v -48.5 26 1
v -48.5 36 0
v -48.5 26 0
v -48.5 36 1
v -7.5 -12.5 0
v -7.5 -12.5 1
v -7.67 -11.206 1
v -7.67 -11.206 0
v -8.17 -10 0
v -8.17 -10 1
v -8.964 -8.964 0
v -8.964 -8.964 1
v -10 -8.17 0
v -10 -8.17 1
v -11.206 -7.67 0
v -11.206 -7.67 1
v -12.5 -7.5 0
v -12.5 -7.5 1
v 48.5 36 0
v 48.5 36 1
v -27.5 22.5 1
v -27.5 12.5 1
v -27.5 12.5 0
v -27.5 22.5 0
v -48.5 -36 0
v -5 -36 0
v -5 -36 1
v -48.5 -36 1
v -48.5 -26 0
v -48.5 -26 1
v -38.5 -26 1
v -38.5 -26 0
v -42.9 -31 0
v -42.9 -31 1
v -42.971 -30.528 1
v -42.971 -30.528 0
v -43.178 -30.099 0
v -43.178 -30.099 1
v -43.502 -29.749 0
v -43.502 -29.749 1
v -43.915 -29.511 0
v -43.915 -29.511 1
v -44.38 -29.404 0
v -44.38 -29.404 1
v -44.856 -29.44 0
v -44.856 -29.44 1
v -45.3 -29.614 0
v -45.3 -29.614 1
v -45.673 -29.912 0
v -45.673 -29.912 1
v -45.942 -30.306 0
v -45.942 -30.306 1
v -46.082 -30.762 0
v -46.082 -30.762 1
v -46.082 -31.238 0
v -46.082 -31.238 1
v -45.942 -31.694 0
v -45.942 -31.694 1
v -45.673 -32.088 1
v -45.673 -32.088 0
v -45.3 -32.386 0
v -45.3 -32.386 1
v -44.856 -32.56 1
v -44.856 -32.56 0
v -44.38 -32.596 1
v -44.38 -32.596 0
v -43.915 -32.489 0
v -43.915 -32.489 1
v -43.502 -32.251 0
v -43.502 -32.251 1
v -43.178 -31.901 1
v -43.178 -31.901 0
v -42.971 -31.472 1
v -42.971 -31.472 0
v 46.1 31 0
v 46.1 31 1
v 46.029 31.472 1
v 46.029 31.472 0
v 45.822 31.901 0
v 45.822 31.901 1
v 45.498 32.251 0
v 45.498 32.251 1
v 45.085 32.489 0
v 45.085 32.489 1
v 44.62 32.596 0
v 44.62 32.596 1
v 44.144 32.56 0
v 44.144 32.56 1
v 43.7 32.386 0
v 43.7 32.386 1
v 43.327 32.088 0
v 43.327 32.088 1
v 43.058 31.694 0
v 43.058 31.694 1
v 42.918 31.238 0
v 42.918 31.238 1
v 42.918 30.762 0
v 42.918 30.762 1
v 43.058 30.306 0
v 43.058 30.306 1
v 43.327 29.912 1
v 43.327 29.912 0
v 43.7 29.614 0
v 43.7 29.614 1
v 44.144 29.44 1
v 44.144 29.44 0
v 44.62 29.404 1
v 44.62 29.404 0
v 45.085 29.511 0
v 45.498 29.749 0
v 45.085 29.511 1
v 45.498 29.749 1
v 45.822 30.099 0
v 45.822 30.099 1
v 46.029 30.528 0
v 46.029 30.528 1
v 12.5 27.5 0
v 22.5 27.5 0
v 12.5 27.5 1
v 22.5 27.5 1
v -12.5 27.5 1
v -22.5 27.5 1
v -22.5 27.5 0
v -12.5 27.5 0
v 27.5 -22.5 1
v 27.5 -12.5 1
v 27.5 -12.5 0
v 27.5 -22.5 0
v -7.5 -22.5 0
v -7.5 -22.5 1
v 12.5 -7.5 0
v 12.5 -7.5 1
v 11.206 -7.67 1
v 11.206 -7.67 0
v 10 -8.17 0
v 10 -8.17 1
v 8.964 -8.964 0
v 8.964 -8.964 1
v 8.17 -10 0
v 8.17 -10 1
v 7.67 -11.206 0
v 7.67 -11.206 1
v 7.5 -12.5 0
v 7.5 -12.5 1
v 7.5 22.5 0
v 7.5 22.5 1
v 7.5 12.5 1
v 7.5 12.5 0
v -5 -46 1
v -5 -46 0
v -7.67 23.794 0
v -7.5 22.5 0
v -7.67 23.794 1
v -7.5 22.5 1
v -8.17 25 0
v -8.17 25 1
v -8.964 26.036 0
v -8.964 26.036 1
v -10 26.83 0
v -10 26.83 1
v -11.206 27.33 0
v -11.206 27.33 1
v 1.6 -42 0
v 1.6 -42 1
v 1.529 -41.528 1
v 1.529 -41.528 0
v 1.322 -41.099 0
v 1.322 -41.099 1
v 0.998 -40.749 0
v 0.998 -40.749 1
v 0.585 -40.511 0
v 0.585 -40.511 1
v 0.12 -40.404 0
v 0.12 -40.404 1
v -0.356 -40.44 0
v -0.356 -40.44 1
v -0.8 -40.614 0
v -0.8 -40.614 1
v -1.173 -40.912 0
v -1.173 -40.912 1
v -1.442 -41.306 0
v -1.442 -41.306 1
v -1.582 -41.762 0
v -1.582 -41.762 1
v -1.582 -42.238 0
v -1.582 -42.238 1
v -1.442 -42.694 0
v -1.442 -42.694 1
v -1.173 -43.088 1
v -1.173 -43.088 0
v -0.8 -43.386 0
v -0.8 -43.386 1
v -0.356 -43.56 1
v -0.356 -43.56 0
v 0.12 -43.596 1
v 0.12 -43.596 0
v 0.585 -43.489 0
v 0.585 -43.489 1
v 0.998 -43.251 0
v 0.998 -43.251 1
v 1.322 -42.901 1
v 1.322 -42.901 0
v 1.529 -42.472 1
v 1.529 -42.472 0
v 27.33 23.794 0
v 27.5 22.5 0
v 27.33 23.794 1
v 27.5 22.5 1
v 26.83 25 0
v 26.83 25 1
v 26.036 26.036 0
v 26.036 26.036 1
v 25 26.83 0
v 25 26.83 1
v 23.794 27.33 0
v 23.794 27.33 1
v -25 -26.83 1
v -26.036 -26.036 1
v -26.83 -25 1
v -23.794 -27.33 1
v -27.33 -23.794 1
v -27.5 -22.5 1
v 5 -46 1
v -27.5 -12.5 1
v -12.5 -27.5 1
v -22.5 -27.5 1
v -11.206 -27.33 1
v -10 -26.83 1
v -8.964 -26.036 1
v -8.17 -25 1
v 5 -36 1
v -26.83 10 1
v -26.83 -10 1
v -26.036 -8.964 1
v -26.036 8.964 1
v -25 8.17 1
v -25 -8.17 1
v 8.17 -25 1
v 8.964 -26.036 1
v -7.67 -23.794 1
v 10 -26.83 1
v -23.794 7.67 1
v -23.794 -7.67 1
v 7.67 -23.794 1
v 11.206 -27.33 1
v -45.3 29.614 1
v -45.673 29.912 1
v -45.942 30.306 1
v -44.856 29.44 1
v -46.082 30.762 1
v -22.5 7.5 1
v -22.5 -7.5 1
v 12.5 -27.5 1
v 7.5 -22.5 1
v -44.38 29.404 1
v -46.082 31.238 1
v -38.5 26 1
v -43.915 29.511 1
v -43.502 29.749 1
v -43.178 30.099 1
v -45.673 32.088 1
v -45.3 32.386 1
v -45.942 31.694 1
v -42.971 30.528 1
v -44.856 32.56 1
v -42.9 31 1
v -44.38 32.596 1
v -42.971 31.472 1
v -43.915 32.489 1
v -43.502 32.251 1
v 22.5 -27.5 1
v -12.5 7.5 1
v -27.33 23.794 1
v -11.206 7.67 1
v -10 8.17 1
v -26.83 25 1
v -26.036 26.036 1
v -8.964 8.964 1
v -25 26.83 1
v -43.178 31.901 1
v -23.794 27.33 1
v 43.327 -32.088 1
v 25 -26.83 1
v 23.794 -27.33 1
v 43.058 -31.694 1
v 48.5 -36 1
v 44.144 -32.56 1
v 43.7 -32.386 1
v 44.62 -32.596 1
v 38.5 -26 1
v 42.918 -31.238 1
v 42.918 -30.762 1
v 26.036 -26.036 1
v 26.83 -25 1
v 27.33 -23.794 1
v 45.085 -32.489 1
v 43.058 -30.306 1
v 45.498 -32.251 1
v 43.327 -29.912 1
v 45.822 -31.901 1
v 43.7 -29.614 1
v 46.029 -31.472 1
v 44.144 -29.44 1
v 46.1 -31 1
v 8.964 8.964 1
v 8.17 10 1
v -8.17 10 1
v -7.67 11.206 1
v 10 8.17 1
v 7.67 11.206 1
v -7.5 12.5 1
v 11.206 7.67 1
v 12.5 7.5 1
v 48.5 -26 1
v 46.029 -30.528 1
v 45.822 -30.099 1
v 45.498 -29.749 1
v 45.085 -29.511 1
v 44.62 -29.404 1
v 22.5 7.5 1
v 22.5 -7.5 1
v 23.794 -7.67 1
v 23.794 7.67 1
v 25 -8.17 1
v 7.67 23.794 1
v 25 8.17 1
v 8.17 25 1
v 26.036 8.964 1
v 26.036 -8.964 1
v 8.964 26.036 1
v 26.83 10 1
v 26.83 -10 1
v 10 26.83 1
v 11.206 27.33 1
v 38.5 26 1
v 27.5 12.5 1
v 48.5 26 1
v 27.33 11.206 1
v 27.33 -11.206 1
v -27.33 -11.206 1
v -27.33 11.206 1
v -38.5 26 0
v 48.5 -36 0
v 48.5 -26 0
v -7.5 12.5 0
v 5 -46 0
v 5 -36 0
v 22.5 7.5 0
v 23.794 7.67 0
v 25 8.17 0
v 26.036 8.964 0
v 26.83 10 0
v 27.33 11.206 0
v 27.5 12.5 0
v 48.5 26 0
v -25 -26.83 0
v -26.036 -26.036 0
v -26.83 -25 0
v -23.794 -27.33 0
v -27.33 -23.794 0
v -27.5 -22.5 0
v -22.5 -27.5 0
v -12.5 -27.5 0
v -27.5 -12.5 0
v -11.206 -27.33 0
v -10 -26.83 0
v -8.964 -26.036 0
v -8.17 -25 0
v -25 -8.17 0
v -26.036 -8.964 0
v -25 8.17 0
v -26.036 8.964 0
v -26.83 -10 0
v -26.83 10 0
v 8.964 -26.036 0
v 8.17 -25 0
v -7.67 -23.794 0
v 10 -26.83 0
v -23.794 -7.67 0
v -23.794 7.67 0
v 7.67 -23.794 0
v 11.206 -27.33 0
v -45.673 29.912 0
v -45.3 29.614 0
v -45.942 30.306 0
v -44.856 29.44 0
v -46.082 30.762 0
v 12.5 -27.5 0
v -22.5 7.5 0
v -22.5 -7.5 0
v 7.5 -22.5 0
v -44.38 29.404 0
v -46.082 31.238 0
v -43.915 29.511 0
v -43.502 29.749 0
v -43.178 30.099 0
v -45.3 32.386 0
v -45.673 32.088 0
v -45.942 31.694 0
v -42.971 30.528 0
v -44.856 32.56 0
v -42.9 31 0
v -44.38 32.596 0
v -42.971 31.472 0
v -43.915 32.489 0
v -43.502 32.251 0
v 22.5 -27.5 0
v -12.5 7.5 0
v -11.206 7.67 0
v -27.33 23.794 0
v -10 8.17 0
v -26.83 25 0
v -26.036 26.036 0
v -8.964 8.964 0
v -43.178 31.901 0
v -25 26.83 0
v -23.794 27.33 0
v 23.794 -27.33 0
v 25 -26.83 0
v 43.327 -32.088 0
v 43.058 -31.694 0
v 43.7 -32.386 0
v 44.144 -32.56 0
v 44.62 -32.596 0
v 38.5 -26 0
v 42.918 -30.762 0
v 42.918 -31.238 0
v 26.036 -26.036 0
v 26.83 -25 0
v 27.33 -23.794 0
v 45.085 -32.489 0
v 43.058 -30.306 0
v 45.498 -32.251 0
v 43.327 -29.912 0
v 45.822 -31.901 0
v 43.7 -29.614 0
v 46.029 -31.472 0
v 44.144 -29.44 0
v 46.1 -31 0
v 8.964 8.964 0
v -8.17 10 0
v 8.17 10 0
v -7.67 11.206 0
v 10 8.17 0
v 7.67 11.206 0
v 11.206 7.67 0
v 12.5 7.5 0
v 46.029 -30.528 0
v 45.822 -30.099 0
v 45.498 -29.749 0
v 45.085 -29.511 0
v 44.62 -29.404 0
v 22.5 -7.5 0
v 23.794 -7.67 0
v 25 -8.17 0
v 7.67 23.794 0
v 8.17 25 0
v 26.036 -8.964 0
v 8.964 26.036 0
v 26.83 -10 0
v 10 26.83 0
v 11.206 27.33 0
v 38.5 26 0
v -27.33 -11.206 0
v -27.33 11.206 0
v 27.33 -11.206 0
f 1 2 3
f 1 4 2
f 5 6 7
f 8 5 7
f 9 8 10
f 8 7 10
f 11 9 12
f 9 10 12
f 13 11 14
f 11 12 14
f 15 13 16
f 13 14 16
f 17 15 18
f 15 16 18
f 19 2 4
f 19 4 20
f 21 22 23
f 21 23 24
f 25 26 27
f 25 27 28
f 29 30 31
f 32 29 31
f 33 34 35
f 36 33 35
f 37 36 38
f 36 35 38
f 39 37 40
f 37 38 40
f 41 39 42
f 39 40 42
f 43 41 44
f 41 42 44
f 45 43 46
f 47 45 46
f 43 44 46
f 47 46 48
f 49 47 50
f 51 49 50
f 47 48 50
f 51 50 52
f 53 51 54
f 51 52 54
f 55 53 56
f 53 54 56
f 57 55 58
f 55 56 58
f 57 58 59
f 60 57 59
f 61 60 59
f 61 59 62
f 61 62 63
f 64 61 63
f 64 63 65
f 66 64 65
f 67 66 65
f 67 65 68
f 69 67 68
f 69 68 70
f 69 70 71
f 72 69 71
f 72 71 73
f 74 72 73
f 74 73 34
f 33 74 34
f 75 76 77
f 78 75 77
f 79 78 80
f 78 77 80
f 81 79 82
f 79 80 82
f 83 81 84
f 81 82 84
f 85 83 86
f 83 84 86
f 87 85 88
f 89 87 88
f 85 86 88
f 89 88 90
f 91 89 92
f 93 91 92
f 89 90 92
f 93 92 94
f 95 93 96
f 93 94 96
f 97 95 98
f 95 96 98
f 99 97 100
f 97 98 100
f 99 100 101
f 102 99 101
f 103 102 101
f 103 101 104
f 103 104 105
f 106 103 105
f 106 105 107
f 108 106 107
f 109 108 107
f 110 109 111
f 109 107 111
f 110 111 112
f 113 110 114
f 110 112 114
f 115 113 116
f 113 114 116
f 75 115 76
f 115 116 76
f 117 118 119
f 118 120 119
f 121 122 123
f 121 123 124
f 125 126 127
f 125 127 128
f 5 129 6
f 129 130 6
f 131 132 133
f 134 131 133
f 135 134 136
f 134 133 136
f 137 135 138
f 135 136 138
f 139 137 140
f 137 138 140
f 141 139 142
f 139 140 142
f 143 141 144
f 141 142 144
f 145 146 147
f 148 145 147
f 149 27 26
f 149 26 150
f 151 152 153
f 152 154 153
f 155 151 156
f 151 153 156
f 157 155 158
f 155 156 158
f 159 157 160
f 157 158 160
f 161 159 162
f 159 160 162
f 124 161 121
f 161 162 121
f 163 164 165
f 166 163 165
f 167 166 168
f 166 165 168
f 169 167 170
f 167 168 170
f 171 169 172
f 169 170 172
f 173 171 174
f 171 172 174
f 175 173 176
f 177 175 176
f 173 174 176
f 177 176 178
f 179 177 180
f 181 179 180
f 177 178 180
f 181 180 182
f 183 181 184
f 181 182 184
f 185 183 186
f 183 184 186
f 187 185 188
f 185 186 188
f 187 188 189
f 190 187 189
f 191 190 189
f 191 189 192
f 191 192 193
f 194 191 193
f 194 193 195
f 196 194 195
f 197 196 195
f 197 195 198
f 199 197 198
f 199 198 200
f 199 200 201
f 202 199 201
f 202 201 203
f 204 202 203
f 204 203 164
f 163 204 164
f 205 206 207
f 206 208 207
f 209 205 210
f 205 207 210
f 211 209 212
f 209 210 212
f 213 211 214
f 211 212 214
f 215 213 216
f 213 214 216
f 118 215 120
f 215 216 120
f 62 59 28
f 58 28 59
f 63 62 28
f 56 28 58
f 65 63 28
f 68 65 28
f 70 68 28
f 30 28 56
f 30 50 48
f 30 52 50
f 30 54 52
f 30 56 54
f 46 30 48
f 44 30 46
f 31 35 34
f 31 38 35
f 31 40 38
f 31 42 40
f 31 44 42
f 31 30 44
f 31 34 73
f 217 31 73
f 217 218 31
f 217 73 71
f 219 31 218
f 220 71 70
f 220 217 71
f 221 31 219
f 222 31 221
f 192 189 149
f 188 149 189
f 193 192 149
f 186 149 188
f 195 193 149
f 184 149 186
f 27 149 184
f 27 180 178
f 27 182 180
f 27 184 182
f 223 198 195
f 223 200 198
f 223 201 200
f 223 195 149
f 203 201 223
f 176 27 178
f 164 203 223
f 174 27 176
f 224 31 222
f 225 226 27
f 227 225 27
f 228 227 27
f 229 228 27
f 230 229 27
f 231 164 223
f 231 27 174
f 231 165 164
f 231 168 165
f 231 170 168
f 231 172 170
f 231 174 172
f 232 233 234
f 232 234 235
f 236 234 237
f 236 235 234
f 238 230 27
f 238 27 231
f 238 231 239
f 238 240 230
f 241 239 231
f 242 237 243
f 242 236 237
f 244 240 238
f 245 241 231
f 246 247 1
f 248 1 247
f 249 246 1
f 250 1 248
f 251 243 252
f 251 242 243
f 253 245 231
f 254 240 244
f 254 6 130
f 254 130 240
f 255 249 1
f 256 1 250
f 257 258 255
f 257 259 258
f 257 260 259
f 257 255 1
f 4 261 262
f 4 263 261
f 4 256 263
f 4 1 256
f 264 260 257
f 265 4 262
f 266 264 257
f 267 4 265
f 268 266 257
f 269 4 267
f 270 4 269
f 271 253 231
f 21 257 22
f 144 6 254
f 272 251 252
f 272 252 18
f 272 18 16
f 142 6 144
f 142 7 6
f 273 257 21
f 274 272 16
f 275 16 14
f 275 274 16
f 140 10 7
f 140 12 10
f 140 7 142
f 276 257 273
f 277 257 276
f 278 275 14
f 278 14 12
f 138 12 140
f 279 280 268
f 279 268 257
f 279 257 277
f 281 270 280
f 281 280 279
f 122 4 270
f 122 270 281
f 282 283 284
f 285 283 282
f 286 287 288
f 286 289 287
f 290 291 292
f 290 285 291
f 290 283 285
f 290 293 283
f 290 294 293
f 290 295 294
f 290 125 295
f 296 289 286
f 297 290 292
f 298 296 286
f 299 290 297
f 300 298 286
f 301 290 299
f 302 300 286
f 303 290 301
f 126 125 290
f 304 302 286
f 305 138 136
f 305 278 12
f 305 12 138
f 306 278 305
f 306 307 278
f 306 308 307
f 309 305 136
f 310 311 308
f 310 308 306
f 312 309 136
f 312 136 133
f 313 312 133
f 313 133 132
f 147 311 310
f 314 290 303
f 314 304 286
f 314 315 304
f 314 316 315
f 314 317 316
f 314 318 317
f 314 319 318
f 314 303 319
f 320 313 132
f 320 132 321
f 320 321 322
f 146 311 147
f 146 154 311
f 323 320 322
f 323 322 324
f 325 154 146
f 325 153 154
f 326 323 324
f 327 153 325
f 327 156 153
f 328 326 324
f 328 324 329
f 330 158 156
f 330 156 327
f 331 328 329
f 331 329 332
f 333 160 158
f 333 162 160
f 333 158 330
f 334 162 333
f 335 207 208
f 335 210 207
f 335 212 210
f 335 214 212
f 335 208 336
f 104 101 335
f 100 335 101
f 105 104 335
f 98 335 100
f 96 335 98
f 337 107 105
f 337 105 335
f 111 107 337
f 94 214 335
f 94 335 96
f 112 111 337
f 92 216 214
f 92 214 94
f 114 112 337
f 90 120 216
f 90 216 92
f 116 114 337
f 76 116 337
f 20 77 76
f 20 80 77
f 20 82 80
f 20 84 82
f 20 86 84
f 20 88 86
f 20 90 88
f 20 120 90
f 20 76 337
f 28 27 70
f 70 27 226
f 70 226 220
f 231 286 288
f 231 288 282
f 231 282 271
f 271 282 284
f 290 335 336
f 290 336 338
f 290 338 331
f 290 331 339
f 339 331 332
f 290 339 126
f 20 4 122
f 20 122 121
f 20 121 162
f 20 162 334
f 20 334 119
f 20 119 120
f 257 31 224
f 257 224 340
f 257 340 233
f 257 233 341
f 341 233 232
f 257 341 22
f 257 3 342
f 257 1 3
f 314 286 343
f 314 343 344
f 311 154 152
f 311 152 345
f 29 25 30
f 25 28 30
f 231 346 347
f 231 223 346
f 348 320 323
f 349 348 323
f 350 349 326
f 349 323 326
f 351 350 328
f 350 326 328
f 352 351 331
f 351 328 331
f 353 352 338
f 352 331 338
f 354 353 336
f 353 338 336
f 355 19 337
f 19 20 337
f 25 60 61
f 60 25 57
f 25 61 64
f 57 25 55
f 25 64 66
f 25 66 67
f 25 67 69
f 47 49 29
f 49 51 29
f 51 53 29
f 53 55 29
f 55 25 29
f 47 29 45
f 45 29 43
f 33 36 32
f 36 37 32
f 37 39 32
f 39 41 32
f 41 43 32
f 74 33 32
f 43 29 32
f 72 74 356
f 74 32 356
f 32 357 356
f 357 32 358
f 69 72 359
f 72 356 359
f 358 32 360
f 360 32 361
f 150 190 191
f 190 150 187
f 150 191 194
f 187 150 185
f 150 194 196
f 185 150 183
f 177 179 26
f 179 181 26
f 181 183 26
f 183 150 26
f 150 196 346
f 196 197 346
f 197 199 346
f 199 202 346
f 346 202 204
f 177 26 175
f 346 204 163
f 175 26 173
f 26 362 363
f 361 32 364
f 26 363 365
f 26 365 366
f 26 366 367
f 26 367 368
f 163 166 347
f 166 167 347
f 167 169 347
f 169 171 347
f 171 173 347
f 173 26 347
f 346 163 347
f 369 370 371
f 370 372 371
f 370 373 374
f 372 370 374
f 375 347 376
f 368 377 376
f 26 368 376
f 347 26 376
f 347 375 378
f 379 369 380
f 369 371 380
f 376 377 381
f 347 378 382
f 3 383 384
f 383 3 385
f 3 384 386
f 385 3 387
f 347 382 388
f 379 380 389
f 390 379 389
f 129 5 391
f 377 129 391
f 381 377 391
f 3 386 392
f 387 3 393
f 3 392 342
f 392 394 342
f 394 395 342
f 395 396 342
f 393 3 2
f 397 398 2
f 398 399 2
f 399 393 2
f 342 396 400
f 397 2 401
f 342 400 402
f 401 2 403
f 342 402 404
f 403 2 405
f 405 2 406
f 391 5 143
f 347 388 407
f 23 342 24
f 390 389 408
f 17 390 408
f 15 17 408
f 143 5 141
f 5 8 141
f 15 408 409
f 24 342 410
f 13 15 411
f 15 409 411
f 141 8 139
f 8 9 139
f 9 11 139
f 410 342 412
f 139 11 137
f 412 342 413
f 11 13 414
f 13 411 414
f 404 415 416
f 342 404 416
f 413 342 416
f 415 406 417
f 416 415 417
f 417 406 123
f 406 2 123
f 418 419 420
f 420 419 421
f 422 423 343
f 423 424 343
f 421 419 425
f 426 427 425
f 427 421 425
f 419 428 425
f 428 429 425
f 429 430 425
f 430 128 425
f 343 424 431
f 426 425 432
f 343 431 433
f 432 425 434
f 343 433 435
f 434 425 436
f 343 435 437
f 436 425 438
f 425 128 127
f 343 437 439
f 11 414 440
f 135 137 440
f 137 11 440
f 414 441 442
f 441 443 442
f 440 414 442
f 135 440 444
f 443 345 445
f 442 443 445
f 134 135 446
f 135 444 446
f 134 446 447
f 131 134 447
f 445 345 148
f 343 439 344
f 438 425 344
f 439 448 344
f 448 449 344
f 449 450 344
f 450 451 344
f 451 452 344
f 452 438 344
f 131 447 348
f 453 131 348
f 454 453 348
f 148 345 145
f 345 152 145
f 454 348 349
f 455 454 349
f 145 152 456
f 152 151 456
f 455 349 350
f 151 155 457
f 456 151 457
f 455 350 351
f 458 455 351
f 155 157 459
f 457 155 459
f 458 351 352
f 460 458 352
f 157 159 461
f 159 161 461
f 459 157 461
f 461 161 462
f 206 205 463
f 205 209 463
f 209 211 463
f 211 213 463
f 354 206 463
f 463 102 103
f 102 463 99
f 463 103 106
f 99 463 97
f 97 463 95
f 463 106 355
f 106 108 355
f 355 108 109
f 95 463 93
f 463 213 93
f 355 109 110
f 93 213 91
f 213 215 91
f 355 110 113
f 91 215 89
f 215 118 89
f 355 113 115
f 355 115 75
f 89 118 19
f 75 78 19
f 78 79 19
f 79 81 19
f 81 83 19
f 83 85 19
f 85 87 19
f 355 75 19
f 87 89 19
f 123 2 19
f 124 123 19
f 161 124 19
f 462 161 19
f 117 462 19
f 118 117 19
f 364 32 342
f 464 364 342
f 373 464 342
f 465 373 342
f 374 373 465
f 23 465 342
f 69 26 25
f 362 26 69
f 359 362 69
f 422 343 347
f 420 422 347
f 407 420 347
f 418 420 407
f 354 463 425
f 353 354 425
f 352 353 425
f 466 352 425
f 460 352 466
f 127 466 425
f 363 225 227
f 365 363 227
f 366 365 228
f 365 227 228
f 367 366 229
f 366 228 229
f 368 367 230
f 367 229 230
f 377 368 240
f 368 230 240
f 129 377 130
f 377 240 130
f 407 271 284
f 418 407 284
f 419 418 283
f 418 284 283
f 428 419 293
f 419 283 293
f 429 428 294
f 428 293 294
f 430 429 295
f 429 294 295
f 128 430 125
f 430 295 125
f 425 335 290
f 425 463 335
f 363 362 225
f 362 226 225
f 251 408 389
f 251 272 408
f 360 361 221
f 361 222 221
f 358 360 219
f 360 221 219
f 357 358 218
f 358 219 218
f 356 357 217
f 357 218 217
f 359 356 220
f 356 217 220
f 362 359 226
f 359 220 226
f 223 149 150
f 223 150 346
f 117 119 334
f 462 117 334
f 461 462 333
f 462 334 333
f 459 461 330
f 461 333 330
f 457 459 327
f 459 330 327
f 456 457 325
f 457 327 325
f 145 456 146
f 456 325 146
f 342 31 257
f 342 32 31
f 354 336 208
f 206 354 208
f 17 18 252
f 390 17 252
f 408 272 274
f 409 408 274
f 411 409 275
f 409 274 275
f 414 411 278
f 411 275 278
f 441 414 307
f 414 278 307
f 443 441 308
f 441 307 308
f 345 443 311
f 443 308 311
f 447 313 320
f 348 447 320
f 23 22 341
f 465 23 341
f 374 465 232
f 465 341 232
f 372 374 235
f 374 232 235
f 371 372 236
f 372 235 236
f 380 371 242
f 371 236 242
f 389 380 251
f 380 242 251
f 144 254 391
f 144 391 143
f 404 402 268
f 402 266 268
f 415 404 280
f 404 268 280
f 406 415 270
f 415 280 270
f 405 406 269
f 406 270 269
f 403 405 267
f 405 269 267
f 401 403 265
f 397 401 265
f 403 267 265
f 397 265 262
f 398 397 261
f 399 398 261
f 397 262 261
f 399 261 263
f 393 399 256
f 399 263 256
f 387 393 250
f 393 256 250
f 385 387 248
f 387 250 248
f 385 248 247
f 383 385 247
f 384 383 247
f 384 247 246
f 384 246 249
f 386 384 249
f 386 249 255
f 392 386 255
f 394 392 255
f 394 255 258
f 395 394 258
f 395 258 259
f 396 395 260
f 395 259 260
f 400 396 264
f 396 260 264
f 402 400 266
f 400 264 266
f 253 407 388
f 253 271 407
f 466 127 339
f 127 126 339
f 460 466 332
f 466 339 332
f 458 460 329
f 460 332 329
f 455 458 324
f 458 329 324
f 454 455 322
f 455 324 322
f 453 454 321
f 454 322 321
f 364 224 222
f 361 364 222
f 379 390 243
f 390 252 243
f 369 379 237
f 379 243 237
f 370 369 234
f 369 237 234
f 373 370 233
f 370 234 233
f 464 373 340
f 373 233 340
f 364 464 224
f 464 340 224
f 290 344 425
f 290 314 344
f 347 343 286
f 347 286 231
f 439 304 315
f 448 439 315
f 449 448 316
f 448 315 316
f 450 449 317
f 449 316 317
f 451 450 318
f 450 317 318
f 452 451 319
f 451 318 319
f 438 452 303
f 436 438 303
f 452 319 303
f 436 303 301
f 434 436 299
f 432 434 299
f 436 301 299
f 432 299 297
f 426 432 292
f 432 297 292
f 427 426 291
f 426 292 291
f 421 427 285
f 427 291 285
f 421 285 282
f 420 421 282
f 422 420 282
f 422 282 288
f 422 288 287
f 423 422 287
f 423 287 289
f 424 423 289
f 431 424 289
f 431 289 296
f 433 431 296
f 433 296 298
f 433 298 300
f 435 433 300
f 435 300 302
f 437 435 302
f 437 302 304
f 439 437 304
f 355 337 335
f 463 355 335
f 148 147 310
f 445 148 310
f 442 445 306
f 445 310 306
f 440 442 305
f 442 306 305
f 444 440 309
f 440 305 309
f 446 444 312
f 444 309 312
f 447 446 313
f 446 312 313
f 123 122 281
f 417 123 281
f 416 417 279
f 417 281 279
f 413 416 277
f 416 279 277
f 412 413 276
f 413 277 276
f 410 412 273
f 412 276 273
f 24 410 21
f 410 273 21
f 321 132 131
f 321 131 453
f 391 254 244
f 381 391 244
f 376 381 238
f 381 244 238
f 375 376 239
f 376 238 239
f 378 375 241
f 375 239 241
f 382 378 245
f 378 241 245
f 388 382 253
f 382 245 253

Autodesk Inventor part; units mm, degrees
ref_plane "YZ Plane" through (0, 0, 0) normal (1, 0, 0) x (0, 1, 0)
ref_plane "XZ Plane" through (0, 0, 0) normal (0, 1, 0) x (-1, 0, 0)
ref_plane "XY Plane" through (0, 0, 0) normal (0, 0, 1) x (1, 0, 0)
sketch "Sketch2" plane through (0, 0, 1) normal (0, 0, 1) x (1, 0, 0)
  line L0 (-38.5, 36) -> (38.5, 36)
  line L1 (-48.5, 26) -> (-38.5, 26)
  line L2 (-38.5, 26) -> (-38.5, 36)
  line L3 (-38.5, 36) -> (-48.5, 36)
  line L4 (-48.5, 36) -> (-48.5, 26)
  line L5 (-48.5, 26) -> (-38.5, 36) construction
  line L6 (-38.5, 26) -> (-48.5, 36) construction
  line L7 (0, 0) -> (0, 7.0571)
  line L8 (0, 0) -> (6.6312, 0)
  line L9 (-38.5, -36) -> (-38.5, 36)
  line L10 (48.5, 26) -> (38.5, 26)
  line L11 (38.5, 26) -> (38.5, 36)
  line L12 (38.5, 36) -> (48.5, 36)
  line L13 (48.5, 36) -> (48.5, 26)
  line L14 (48.5, 26) -> (38.5, 36) construction
  line L15 (38.5, 26) -> (48.5, 36) construction
  circle A0 centre (-44.5, 31) radius 1.6
  circle A1 centre (44.5, 31) radius 1.6
  line L16 (38.5, -36) -> (-38.5, -36)
  line L17 (-5, -46) -> (5, -46)
  line L18 (5, -46) -> (5, -36)
  line L19 (5, -36) -> (-5, -36)
  line L20 (-5, -36) -> (-5, -46)
  line L21 (-5, -46) -> (5, -36) construction
  line L22 (5, -46) -> (-5, -36) construction
  circle A2 centre (0, -42) radius 1.6
  line L23 (-48.5, -26) -> (-38.5, -26)
  line L24 (-38.5, -26) -> (-38.5, -36)
  line L25 (-38.5, -36) -> (-48.5, -36)
  line L26 (-48.5, -36) -> (-48.5, -26)
  line L27 (-48.5, -26) -> (-38.5, -36) construction
  line L28 (-38.5, -26) -> (-48.5, -36) construction
  line L29 (38.5, -26) -> (38.5, -36)
  line L30 (38.5, -36) -> (48.5, -36)
  line L31 (48.5, -36) -> (48.5, -26)
  line L32 (48.5, -26) -> (38.5, -36) construction
  line L33 (38.5, -26) -> (48.5, -36) construction
  line L34 (48.5, -26) -> (38.5, -26)
  circle A3 centre (-44.5, -31) radius 1.6
  circle A4 centre (44.5, -31) radius 1.6
  point P0 (-43.5, 31)
  point P1 (43.5, 31)
  point P2 (0, -41)
  point P3 (-38.5, -36)
  point P4 (-43.5, -31)
  point P5 (43.5, -31)
  dimension "d5" = 10
  dimension "d6" = 10
  dimension "d10" = 3.2
  dimension "d12" = 4
  dimension "d18" = 3.2
  dimension "d19" = 10
  dimension "d20" = 10
  dimension "d21" = 4
  dimension "d22" = 5
sketch "Sketch1" plane through (0, 0, 0) normal (0, 0, 1) x (1, 0, 0)
  line L0 (-38.5, 36) -> (38.5, 36)
  line L1 (38.5, 36) -> (38.5, -36)
  line L2 (38.5, -36) -> (-38.5, -36)
  line L3 (-38.5, -36) -> (-38.5, 36)
  line L4 (-38.5, 36) -> (38.5, -36) construction
  line L5 (38.5, 36) -> (-38.5, -36) construction
  point P0 (0, 0)
  dimension "d0" = 72
  dimension "d1" = 77
extrude "Plate1" add sketch "Sketch1" along normal blind 1
sketch "Sketch3" plane through (0, 0, 1) normal (0, 0, 1) x (1, 0, 0)
  line L0 (-22.5, 27.5) -> (-12.5, 27.5)
  line L1 (-7.5, 22.5) -> (-7.5, 12.5)
  line L2 (-12.5, 7.5) -> (-22.5, 7.5)
  line L3 (-27.5, 12.5) -> (-27.5, 22.5)
  line L4 (-27.5, 27.5) -> (-7.5, 7.5) construction
  line L5 (-7.5, 27.5) -> (-27.5, 7.5) construction
  line L6 (-11.1923, 0) -> (11.1923, 0)
  line L7 (0, 8.4231) -> (0, -8.4231)
  arc A0 (-22.5, 27.5) -> (-27.5, 22.5) centre (-22.5, 22.5) ccw
  arc A1 (-7.5, 22.5) -> (-12.5, 27.5) centre (-12.5, 22.5) ccw
  arc A2 (-12.5, 7.5) -> (-7.5, 12.5) centre (-12.5, 12.5) ccw
  arc A3 (-27.5, 12.5) -> (-22.5, 7.5) centre (-22.5, 12.5) ccw
  line L8 (22.5, 27.5) -> (12.5, 27.5)
  line L9 (7.5, 22.5) -> (7.5, 12.5)
  line L10 (12.5, 7.5) -> (22.5, 7.5)
  line L11 (27.5, 12.5) -> (27.5, 22.5)
  line L12 (27.5, 27.5) -> (7.5, 7.5) construction
  line L13 (7.5, 27.5) -> (27.5, 7.5) construction
  arc A4 (27.5, 22.5) -> (22.5, 27.5) centre (22.5, 22.5) ccw
  arc A5 (12.5, 27.5) -> (7.5, 22.5) centre (12.5, 22.5) ccw
  arc A6 (7.5, 12.5) -> (12.5, 7.5) centre (12.5, 12.5) ccw
  arc A7 (22.5, 7.5) -> (27.5, 12.5) centre (22.5, 12.5) ccw
  line L14 (-22.5, -27.5) -> (-12.5, -27.5)
  line L15 (-7.5, -22.5) -> (-7.5, -12.5)
  line L16 (-12.5, -7.5) -> (-22.5, -7.5)
  line L17 (-27.5, -12.5) -> (-27.5, -22.5)
  line L18 (-27.5, -27.5) -> (-7.5, -7.5) construction
  line L19 (-7.5, -27.5) -> (-27.5, -7.5) construction
  arc A8 (-27.5, -22.5) -> (-22.5, -27.5) centre (-22.5, -22.5) ccw
  arc A9 (-12.5, -27.5) -> (-7.5, -22.5) centre (-12.5, -22.5) ccw
  arc A10 (-7.5, -12.5) -> (-12.5, -7.5) centre (-12.5, -12.5) ccw
  arc A11 (-22.5, -7.5) -> (-27.5, -12.5) centre (-22.5, -12.5) ccw
  line L20 (7.5, -22.5) -> (7.5, -12.5)
  arc A12 (12.5, -7.5) -> (7.5, -12.5) centre (12.5, -12.5) ccw
  arc A13 (7.5, -22.5) -> (12.5, -27.5) centre (12.5, -22.5) ccw
  line L21 (22.5, -27.5) -> (12.5, -27.5)
  line L22 (12.5, -7.5) -> (22.5, -7.5)
  line L23 (27.5, -27.5) -> (7.5, -7.5) construction
  line L24 (7.5, -27.5) -> (27.5, -7.5) construction
  arc A14 (27.5, -12.5) -> (22.5, -7.5) centre (22.5, -12.5) ccw
  line L25 (27.5, -12.5) -> (27.5, -22.5)
  arc A15 (22.5, -27.5) -> (27.5, -22.5) centre (22.5, -22.5) ccw
  point P0 (0, 0)
  point P1 (-17.5, 17.5)
  point P2 (0, 0)
  point P3 (17.5, 17.5)
  point P4 (-17.5, -17.5)
  point P5 (17.5, -17.5)
  dimension "d29" = 20
  dimension "d30" = 15
  dimension "d31" = 15
  dimension "d32" = 20
  dimension "d33" = 5
extrude "Cut1" cut sketch "Sketch3" against normal blind 1
sheet face with bend "Face2" sketch "Sketch2" thickness 1 toward (0, 0, -1) bend radius 1
bend "Bend1"
equation "\"d34\" = 厚度"
equation "\"d2\" = 厚度"
equation "\"d13\" = 折彎半徑"
equation "\"d14\" = 折彎離隙寬度"
equation "\"d16\" = 最小剩餘"
equation "\"d15\" = 折彎離隙深度"
equation "\"d17\" = 轉移半徑"
equation "\"折彎半徑\" = 厚度"
equation "\"折彎離隙寬度\" = 厚度"
equation "\"折彎離隙深度\" = 0.5 * 厚度"
equation "\"轉角離隙大小\" = 4 * 厚度"
equation "\"最小剩餘\" = 2 * 厚度"
equation "\"轉移半徑\" = 折彎半徑"
equation "\"Jacobi半徑大小\" = 折彎半徑"
equation "\"間隙大小\" = 厚度"
equation "\"厚度\" = 1"
properties part number "battery_box_24V_top" material "Aluminum"
